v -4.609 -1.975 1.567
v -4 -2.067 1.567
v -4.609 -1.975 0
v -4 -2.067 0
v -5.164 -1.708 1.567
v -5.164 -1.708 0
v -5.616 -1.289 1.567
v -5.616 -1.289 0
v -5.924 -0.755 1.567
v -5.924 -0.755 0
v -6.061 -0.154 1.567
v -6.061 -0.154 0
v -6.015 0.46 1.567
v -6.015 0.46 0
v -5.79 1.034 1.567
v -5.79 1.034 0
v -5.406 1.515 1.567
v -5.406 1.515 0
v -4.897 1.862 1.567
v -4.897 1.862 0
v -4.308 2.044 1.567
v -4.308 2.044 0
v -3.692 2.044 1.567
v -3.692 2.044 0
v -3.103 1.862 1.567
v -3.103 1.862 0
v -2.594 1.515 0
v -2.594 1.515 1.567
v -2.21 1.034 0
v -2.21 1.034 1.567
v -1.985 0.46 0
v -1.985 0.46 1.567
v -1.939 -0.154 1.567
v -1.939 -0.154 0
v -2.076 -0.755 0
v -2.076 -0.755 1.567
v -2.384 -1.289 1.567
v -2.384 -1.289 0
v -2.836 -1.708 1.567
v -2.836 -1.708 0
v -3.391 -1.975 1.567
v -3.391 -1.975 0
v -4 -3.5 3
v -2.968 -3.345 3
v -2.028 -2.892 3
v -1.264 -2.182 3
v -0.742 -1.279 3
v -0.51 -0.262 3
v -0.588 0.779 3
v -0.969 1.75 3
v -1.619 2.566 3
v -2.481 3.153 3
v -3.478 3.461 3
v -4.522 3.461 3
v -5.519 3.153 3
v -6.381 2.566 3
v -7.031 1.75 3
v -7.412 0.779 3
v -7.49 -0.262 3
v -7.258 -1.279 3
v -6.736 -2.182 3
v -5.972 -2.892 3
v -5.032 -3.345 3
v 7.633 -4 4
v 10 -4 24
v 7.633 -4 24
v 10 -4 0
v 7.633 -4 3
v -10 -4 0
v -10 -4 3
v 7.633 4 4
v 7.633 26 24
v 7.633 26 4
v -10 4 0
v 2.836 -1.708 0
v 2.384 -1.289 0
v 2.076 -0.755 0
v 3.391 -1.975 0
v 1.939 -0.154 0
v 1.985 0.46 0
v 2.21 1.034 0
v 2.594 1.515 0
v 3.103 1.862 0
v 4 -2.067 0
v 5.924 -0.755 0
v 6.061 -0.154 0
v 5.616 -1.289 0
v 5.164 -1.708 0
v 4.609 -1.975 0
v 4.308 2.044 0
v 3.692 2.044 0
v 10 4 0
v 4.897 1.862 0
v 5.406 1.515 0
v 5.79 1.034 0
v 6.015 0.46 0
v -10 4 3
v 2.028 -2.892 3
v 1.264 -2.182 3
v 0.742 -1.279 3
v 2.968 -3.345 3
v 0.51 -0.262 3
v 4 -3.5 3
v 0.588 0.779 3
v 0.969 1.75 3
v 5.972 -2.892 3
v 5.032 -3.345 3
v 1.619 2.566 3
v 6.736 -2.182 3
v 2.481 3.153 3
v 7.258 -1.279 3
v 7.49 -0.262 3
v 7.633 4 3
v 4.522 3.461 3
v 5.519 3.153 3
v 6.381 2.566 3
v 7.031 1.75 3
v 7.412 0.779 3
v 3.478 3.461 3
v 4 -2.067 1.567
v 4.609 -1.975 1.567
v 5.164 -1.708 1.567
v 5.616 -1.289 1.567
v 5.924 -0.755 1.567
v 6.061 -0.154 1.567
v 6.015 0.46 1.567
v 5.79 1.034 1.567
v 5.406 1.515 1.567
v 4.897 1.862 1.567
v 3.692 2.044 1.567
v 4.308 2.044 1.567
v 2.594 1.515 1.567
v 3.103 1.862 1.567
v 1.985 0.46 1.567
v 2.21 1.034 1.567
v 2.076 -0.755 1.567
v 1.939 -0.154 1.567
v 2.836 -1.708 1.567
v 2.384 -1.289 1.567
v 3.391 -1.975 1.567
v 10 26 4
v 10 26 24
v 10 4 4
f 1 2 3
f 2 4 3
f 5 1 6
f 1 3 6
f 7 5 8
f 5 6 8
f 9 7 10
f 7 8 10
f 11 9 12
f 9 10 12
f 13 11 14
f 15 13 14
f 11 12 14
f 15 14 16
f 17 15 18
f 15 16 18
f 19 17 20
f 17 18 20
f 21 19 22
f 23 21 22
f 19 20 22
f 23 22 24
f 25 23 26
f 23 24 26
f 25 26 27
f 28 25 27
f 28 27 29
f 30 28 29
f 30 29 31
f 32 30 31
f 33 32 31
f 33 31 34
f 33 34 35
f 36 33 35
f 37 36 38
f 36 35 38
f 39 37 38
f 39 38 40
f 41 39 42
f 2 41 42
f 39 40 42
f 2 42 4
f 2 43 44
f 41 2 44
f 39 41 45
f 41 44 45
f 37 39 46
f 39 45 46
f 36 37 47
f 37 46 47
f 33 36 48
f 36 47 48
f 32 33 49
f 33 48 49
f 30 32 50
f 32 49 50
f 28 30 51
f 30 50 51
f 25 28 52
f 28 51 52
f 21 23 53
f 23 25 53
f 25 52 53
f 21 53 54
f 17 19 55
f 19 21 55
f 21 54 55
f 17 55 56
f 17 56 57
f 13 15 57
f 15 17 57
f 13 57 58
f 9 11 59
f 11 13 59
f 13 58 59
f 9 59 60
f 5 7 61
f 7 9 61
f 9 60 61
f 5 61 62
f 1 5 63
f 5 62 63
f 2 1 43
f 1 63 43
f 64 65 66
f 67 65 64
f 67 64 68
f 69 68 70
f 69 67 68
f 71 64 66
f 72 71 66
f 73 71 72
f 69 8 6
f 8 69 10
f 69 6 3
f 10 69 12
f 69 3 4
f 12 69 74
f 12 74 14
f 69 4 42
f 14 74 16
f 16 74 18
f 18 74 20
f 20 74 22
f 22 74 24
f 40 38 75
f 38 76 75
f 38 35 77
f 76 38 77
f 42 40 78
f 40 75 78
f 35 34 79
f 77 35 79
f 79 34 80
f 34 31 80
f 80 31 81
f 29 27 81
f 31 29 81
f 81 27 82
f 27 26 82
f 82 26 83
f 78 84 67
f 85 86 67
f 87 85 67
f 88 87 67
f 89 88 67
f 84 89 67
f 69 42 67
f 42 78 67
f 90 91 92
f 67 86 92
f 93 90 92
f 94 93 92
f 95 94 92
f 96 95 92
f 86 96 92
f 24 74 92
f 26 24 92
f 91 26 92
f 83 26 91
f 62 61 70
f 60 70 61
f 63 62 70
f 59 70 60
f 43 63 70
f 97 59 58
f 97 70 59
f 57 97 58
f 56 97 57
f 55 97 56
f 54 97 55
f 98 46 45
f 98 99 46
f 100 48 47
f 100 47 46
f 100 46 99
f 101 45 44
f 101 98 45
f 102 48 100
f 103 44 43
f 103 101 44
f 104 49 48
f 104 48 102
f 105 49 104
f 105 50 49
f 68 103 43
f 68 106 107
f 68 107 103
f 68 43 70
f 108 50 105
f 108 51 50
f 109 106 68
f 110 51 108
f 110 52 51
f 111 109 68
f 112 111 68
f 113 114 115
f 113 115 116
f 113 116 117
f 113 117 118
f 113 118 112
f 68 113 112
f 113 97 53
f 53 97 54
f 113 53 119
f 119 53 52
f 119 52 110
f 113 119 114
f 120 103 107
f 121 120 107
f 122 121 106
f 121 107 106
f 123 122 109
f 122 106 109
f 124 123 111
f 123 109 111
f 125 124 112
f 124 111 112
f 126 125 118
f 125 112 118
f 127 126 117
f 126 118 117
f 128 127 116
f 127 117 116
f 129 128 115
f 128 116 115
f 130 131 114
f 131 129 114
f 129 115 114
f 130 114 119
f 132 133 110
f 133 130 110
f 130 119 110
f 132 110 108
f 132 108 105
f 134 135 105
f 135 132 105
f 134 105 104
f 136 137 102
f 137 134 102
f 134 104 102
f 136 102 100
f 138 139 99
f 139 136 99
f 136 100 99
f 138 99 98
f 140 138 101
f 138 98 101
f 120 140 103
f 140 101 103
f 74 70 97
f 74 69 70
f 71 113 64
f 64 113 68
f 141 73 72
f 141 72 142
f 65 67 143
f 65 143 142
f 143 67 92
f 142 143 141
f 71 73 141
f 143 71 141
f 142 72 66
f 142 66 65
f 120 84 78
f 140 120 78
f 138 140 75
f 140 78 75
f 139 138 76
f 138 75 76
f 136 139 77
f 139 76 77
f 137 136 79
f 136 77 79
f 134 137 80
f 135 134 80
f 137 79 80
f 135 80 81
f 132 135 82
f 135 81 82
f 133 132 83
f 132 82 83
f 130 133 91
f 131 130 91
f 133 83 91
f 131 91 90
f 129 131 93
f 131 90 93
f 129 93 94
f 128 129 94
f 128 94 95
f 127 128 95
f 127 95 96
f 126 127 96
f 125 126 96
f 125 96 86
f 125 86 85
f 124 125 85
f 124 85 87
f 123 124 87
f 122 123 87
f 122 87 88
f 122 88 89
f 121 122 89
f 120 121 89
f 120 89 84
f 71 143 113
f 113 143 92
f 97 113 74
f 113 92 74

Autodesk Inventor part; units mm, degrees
ref_plane "YZ Plane" through (0, 0, 0) normal (1, 0, 0) x (0, 1, 0)
ref_plane "XZ Plane" through (0, 0, 0) normal (0, 1, 0) x (-1, 0, 0)
ref_plane "XY Plane" through (0, 0, 0) normal (0, 0, 1) x (1, 0, 0)
sketch "Szkic1" plane through (0, 0, 0) normal (0, 0, 1) x (1, 0, 0)
  line L0 (-10, 4) -> (10, 4)
  line L1 (10, 4) -> (10, -4)
  line L2 (10, -4) -> (-10, -4)
  line L3 (-10, -4) -> (-10, 4)
  line L4 (-10, 4) -> (10, -4) construction
  line L5 (10, 4) -> (-10, -4) construction
  point P0 (0, 0)
  dimension "d0" = 8
  dimension "d1" = 20
extrude "Wyciągnięcie proste1" add sketch "Szkic1" along normal blind 3
sketch "Szkic2" plane through (0, 0, 3) normal (0, 0, 1) x (1, 0, 0)
  line L0 (-10, 4) -> (-10, -4) projected
  point P0 (0, 0)
  point P1 (-4, 0)
  point P2 (4, 0)
  dimension "d6" = 8
  dimension "d7" = 6
hole "Otwór1" at (-4, 0, 3) at (4, 0, 3) direction (0, 0, -1) diameter 4.134 depth 7 tip angle 118 countersink diameter 7 countersink angle 90 thread size "M5x0.8" class "6H" standard "ISO Metric profile"
sketch "Szkic3" plane through (0, 0, 3) normal (0, 0, 1) x (1, 0, 0)
  line L0 (10, 4) -> (-10, 4) projected
  line L1 (-10, -4) -> (10, -4) projected
  line L2 (10, 4) -> (7.6326, 4)
  line L3 (7.6326, 4) -> (7.6326, -4)
  line L4 (7.6326, -4) -> (10, -4)
  line L5 (10, -4) -> (10, 4)
  point P0 (0, 0)
  point P1 (10, -4)
extrude "Wyciągnięcie proste2" add sketch "Szkic3" along normal blind 1
sketch "Szkic4" plane through (0, 0, 4) normal (0, 0, 1) x (1, 0, 0)
  line L0 (10, -4) -> (10, 4) projected
  line L1 (10, -4) -> (7.633, -4)
  line L2 (7.633, -4) -> (7.633, 26)
  line L3 (7.633, 26) -> (10, 26)
  line L4 (10, 26) -> (10, -4)
  point P0 (0, 0)
  dimension "d17" = 2.367
  dimension "d18" = 30
extrude "Wyciągnięcie proste3" add sketch "Szkic4" along normal blind 20
properties part number "chwyt"
